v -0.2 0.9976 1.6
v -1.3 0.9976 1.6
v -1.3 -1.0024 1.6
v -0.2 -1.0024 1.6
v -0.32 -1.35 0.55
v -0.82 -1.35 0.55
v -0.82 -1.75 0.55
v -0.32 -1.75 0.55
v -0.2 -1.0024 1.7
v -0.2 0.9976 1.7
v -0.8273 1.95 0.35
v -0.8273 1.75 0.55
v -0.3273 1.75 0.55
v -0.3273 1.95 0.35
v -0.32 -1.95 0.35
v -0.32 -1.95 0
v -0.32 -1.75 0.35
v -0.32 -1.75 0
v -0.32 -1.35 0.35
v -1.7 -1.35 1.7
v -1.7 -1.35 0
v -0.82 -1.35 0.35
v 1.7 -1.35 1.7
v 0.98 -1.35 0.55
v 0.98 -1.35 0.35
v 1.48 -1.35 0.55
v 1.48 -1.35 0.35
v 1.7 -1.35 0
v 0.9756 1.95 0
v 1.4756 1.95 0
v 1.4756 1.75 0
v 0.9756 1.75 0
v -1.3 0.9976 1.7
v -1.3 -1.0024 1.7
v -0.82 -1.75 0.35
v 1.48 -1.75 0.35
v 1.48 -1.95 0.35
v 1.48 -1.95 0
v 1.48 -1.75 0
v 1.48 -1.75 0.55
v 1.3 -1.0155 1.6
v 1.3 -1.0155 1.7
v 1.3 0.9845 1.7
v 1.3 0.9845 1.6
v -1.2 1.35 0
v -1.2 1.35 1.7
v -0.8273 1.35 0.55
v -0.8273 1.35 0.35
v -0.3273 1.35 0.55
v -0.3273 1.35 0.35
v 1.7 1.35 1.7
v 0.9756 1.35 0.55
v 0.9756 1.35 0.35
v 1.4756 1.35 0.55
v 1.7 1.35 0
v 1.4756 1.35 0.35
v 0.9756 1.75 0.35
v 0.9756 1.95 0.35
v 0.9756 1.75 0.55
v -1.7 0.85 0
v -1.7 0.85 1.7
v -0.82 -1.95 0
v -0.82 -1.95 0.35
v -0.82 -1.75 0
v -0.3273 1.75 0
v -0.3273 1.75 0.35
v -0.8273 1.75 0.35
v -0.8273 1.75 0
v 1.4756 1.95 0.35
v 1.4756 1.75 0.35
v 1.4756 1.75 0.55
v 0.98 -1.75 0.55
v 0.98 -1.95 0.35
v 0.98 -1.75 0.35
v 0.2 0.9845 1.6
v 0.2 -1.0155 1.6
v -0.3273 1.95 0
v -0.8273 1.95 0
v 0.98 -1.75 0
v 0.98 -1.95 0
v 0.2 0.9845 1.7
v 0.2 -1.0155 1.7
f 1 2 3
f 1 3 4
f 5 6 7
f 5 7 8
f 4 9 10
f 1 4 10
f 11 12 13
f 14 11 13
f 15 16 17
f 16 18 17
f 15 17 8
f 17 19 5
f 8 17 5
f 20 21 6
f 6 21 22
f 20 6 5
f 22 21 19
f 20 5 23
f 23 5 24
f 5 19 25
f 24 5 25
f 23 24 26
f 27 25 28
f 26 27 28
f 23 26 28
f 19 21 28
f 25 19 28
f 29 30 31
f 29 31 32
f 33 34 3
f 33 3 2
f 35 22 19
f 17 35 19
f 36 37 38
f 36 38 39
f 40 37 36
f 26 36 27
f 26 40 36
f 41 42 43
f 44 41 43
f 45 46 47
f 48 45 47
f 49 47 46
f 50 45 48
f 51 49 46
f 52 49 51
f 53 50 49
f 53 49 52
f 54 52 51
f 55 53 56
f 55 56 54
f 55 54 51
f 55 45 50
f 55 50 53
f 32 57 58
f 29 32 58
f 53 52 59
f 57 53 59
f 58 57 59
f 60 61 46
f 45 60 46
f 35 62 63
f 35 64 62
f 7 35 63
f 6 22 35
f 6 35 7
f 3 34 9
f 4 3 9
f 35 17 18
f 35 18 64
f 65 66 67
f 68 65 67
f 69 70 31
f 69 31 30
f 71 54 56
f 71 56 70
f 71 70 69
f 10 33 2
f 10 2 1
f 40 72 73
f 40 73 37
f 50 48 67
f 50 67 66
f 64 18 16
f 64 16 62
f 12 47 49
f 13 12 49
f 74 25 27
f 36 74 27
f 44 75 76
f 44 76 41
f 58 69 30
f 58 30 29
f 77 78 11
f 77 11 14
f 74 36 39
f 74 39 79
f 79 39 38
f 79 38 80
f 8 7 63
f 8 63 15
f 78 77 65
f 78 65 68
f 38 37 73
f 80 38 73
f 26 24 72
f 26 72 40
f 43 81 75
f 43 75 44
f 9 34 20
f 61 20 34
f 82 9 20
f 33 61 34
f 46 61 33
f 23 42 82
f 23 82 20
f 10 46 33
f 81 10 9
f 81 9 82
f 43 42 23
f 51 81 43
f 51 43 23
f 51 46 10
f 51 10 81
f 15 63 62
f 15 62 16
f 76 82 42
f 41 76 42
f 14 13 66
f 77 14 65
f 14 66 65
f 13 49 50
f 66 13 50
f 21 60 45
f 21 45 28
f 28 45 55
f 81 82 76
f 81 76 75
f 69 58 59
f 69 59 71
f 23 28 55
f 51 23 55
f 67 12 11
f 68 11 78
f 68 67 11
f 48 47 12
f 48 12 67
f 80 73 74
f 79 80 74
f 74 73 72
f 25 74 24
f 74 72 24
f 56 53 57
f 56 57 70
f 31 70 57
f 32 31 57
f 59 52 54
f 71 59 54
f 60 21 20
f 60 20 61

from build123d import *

# Parameters (mm, degrees)
SKICA1_W                 = 3.4
SKICA1_H                 = 2.7
P_IDAT_VYSUNUT_M1_DEPTH  = 1.7
SKICA2_W                 = 1.1
SKICA2_H                 = 2
ODEBRAT_VYSUNUT_M2_DEPTH = 0.1
ODEBRAT_VYSUNUT_M4_DEPTH = 3.757263136
SKICA5_W                 = 0.5
SKICA5_H                 = 0.2
P_IDAT_VYSUNUT_M2_DEPTH  = 0.6
SKICA6_W                 = 0.5
SKICA6_H                 = 0.2
P_IDAT_VYSUNUT_M3_DEPTH  = 0.35
ZKOSEN_2_SIZE            = 0.2
SKICA8_W                 = 0.5
SKICA8_H                 = 0.2
P_IDAT_VYSUNUT_M4_DEPTH  = 0.6
SKICA9_W                 = 0.5
SKICA9_H                 = 0.2
P_IDAT_VYSUNUT_M5_DEPTH  = 0.35
ZKOSEN_3_SIZE            = 0.2


with BuildPart() as part:
    # Skica1 → Přidat vysunutím1 (new body)
    with BuildSketch(Plane.XY):
        Rectangle(SKICA1_W, SKICA1_H)
    extrude(amount=P_IDAT_VYSUNUT_M1_DEPTH)

    # Skica2 → Odebrat vysunutím2 (cut)
    with BuildSketch(Plane.XY.offset(1.7)):
        with Locations((-0.75, -0.002377928)):
            Rectangle(SKICA2_W, SKICA2_H)
        with Locations((0.75, -0.015526056)):
            Rectangle(SKICA2_W, SKICA2_H)
    extrude(amount=-ODEBRAT_VYSUNUT_M2_DEPTH, mode=Mode.SUBTRACT)

    # Skica4 → Odebrat vysunutím4 (cut, through all)
    with BuildSketch(Plane.XY.offset(1.7)):
        Polygon((-1.7, 0.85), (-1.2, 1.35), (-1.7, 1.35), align=None)
    extrude(amount=-ODEBRAT_VYSUNUT_M4_DEPTH, mode=Mode.SUBTRACT)

    # Skica5 → Přidat vysunutím2 (add)
    with BuildSketch(Plane(origin=(0, 1.35, 0), x_dir=(1, 0, 0), z_dir=(0, 1, 0))):
        with Locations((1.22555684, -0.45)):
            Rectangle(SKICA5_W, SKICA5_H)
        with Locations((-0.577330956, -0.45)):
            Rectangle(SKICA5_W, SKICA5_H)
    extrude(amount=P_IDAT_VYSUNUT_M2_DEPTH)

    # Skica6 → Přidat vysunutím3 (add)
    with BuildSketch(Plane(origin=(0, 0, 0.35), x_dir=(-1, 0, 0), z_dir=(0, 0, -1))):
        with Locations((-1.22555684, 1.85)):
            Rectangle(SKICA6_W, SKICA6_H)
        with Locations((0.577330956, 1.85)):
            Rectangle(SKICA6_W, SKICA6_H)
    extrude(amount=P_IDAT_VYSUNUT_M3_DEPTH)

    # Zkosení2
    zkosen_2_edges = [part.edges().sort_by_distance(p)[0] for p in [
        (1.22555684, 1.95, 0.55),
        (-0.577330956, 1.95, 0.55),
    ]]
    chamfer(zkosen_2_edges, length=ZKOSEN_2_SIZE)

    # Skica8 → Přidat vysunutím4 (add)
    with BuildSketch(Plane.XZ.offset(1.35)):
        with Locations((1.23, 0.45)):
            Rectangle(SKICA8_W, SKICA8_H)
        with Locations((-0.57, 0.45)):
            Rectangle(SKICA8_W, SKICA8_H)
    extrude(amount=P_IDAT_VYSUNUT_M4_DEPTH)

    # Skica9 → Přidat vysunutím5 (add)
    with BuildSketch(Plane(origin=(0, 0, 0.35), x_dir=(-1, 0, 0), z_dir=(0, 0, -1))):
        with Locations((-1.23, -1.85)):
            Rectangle(SKICA9_W, SKICA9_H)
        with Locations((0.57, -1.85)):
            Rectangle(SKICA9_W, SKICA9_H)
    extrude(amount=P_IDAT_VYSUNUT_M5_DEPTH)

    # Zkosení3
    zkosen_3_edges = [part.edges().sort_by_distance(p)[0] for p in [
        (1.23, -1.95, 0.55),
        (-0.57, -1.95, 0.55),
    ]]
    chamfer(zkosen_3_edges, length=ZKOSEN_3_SIZE)


solid = part.part
